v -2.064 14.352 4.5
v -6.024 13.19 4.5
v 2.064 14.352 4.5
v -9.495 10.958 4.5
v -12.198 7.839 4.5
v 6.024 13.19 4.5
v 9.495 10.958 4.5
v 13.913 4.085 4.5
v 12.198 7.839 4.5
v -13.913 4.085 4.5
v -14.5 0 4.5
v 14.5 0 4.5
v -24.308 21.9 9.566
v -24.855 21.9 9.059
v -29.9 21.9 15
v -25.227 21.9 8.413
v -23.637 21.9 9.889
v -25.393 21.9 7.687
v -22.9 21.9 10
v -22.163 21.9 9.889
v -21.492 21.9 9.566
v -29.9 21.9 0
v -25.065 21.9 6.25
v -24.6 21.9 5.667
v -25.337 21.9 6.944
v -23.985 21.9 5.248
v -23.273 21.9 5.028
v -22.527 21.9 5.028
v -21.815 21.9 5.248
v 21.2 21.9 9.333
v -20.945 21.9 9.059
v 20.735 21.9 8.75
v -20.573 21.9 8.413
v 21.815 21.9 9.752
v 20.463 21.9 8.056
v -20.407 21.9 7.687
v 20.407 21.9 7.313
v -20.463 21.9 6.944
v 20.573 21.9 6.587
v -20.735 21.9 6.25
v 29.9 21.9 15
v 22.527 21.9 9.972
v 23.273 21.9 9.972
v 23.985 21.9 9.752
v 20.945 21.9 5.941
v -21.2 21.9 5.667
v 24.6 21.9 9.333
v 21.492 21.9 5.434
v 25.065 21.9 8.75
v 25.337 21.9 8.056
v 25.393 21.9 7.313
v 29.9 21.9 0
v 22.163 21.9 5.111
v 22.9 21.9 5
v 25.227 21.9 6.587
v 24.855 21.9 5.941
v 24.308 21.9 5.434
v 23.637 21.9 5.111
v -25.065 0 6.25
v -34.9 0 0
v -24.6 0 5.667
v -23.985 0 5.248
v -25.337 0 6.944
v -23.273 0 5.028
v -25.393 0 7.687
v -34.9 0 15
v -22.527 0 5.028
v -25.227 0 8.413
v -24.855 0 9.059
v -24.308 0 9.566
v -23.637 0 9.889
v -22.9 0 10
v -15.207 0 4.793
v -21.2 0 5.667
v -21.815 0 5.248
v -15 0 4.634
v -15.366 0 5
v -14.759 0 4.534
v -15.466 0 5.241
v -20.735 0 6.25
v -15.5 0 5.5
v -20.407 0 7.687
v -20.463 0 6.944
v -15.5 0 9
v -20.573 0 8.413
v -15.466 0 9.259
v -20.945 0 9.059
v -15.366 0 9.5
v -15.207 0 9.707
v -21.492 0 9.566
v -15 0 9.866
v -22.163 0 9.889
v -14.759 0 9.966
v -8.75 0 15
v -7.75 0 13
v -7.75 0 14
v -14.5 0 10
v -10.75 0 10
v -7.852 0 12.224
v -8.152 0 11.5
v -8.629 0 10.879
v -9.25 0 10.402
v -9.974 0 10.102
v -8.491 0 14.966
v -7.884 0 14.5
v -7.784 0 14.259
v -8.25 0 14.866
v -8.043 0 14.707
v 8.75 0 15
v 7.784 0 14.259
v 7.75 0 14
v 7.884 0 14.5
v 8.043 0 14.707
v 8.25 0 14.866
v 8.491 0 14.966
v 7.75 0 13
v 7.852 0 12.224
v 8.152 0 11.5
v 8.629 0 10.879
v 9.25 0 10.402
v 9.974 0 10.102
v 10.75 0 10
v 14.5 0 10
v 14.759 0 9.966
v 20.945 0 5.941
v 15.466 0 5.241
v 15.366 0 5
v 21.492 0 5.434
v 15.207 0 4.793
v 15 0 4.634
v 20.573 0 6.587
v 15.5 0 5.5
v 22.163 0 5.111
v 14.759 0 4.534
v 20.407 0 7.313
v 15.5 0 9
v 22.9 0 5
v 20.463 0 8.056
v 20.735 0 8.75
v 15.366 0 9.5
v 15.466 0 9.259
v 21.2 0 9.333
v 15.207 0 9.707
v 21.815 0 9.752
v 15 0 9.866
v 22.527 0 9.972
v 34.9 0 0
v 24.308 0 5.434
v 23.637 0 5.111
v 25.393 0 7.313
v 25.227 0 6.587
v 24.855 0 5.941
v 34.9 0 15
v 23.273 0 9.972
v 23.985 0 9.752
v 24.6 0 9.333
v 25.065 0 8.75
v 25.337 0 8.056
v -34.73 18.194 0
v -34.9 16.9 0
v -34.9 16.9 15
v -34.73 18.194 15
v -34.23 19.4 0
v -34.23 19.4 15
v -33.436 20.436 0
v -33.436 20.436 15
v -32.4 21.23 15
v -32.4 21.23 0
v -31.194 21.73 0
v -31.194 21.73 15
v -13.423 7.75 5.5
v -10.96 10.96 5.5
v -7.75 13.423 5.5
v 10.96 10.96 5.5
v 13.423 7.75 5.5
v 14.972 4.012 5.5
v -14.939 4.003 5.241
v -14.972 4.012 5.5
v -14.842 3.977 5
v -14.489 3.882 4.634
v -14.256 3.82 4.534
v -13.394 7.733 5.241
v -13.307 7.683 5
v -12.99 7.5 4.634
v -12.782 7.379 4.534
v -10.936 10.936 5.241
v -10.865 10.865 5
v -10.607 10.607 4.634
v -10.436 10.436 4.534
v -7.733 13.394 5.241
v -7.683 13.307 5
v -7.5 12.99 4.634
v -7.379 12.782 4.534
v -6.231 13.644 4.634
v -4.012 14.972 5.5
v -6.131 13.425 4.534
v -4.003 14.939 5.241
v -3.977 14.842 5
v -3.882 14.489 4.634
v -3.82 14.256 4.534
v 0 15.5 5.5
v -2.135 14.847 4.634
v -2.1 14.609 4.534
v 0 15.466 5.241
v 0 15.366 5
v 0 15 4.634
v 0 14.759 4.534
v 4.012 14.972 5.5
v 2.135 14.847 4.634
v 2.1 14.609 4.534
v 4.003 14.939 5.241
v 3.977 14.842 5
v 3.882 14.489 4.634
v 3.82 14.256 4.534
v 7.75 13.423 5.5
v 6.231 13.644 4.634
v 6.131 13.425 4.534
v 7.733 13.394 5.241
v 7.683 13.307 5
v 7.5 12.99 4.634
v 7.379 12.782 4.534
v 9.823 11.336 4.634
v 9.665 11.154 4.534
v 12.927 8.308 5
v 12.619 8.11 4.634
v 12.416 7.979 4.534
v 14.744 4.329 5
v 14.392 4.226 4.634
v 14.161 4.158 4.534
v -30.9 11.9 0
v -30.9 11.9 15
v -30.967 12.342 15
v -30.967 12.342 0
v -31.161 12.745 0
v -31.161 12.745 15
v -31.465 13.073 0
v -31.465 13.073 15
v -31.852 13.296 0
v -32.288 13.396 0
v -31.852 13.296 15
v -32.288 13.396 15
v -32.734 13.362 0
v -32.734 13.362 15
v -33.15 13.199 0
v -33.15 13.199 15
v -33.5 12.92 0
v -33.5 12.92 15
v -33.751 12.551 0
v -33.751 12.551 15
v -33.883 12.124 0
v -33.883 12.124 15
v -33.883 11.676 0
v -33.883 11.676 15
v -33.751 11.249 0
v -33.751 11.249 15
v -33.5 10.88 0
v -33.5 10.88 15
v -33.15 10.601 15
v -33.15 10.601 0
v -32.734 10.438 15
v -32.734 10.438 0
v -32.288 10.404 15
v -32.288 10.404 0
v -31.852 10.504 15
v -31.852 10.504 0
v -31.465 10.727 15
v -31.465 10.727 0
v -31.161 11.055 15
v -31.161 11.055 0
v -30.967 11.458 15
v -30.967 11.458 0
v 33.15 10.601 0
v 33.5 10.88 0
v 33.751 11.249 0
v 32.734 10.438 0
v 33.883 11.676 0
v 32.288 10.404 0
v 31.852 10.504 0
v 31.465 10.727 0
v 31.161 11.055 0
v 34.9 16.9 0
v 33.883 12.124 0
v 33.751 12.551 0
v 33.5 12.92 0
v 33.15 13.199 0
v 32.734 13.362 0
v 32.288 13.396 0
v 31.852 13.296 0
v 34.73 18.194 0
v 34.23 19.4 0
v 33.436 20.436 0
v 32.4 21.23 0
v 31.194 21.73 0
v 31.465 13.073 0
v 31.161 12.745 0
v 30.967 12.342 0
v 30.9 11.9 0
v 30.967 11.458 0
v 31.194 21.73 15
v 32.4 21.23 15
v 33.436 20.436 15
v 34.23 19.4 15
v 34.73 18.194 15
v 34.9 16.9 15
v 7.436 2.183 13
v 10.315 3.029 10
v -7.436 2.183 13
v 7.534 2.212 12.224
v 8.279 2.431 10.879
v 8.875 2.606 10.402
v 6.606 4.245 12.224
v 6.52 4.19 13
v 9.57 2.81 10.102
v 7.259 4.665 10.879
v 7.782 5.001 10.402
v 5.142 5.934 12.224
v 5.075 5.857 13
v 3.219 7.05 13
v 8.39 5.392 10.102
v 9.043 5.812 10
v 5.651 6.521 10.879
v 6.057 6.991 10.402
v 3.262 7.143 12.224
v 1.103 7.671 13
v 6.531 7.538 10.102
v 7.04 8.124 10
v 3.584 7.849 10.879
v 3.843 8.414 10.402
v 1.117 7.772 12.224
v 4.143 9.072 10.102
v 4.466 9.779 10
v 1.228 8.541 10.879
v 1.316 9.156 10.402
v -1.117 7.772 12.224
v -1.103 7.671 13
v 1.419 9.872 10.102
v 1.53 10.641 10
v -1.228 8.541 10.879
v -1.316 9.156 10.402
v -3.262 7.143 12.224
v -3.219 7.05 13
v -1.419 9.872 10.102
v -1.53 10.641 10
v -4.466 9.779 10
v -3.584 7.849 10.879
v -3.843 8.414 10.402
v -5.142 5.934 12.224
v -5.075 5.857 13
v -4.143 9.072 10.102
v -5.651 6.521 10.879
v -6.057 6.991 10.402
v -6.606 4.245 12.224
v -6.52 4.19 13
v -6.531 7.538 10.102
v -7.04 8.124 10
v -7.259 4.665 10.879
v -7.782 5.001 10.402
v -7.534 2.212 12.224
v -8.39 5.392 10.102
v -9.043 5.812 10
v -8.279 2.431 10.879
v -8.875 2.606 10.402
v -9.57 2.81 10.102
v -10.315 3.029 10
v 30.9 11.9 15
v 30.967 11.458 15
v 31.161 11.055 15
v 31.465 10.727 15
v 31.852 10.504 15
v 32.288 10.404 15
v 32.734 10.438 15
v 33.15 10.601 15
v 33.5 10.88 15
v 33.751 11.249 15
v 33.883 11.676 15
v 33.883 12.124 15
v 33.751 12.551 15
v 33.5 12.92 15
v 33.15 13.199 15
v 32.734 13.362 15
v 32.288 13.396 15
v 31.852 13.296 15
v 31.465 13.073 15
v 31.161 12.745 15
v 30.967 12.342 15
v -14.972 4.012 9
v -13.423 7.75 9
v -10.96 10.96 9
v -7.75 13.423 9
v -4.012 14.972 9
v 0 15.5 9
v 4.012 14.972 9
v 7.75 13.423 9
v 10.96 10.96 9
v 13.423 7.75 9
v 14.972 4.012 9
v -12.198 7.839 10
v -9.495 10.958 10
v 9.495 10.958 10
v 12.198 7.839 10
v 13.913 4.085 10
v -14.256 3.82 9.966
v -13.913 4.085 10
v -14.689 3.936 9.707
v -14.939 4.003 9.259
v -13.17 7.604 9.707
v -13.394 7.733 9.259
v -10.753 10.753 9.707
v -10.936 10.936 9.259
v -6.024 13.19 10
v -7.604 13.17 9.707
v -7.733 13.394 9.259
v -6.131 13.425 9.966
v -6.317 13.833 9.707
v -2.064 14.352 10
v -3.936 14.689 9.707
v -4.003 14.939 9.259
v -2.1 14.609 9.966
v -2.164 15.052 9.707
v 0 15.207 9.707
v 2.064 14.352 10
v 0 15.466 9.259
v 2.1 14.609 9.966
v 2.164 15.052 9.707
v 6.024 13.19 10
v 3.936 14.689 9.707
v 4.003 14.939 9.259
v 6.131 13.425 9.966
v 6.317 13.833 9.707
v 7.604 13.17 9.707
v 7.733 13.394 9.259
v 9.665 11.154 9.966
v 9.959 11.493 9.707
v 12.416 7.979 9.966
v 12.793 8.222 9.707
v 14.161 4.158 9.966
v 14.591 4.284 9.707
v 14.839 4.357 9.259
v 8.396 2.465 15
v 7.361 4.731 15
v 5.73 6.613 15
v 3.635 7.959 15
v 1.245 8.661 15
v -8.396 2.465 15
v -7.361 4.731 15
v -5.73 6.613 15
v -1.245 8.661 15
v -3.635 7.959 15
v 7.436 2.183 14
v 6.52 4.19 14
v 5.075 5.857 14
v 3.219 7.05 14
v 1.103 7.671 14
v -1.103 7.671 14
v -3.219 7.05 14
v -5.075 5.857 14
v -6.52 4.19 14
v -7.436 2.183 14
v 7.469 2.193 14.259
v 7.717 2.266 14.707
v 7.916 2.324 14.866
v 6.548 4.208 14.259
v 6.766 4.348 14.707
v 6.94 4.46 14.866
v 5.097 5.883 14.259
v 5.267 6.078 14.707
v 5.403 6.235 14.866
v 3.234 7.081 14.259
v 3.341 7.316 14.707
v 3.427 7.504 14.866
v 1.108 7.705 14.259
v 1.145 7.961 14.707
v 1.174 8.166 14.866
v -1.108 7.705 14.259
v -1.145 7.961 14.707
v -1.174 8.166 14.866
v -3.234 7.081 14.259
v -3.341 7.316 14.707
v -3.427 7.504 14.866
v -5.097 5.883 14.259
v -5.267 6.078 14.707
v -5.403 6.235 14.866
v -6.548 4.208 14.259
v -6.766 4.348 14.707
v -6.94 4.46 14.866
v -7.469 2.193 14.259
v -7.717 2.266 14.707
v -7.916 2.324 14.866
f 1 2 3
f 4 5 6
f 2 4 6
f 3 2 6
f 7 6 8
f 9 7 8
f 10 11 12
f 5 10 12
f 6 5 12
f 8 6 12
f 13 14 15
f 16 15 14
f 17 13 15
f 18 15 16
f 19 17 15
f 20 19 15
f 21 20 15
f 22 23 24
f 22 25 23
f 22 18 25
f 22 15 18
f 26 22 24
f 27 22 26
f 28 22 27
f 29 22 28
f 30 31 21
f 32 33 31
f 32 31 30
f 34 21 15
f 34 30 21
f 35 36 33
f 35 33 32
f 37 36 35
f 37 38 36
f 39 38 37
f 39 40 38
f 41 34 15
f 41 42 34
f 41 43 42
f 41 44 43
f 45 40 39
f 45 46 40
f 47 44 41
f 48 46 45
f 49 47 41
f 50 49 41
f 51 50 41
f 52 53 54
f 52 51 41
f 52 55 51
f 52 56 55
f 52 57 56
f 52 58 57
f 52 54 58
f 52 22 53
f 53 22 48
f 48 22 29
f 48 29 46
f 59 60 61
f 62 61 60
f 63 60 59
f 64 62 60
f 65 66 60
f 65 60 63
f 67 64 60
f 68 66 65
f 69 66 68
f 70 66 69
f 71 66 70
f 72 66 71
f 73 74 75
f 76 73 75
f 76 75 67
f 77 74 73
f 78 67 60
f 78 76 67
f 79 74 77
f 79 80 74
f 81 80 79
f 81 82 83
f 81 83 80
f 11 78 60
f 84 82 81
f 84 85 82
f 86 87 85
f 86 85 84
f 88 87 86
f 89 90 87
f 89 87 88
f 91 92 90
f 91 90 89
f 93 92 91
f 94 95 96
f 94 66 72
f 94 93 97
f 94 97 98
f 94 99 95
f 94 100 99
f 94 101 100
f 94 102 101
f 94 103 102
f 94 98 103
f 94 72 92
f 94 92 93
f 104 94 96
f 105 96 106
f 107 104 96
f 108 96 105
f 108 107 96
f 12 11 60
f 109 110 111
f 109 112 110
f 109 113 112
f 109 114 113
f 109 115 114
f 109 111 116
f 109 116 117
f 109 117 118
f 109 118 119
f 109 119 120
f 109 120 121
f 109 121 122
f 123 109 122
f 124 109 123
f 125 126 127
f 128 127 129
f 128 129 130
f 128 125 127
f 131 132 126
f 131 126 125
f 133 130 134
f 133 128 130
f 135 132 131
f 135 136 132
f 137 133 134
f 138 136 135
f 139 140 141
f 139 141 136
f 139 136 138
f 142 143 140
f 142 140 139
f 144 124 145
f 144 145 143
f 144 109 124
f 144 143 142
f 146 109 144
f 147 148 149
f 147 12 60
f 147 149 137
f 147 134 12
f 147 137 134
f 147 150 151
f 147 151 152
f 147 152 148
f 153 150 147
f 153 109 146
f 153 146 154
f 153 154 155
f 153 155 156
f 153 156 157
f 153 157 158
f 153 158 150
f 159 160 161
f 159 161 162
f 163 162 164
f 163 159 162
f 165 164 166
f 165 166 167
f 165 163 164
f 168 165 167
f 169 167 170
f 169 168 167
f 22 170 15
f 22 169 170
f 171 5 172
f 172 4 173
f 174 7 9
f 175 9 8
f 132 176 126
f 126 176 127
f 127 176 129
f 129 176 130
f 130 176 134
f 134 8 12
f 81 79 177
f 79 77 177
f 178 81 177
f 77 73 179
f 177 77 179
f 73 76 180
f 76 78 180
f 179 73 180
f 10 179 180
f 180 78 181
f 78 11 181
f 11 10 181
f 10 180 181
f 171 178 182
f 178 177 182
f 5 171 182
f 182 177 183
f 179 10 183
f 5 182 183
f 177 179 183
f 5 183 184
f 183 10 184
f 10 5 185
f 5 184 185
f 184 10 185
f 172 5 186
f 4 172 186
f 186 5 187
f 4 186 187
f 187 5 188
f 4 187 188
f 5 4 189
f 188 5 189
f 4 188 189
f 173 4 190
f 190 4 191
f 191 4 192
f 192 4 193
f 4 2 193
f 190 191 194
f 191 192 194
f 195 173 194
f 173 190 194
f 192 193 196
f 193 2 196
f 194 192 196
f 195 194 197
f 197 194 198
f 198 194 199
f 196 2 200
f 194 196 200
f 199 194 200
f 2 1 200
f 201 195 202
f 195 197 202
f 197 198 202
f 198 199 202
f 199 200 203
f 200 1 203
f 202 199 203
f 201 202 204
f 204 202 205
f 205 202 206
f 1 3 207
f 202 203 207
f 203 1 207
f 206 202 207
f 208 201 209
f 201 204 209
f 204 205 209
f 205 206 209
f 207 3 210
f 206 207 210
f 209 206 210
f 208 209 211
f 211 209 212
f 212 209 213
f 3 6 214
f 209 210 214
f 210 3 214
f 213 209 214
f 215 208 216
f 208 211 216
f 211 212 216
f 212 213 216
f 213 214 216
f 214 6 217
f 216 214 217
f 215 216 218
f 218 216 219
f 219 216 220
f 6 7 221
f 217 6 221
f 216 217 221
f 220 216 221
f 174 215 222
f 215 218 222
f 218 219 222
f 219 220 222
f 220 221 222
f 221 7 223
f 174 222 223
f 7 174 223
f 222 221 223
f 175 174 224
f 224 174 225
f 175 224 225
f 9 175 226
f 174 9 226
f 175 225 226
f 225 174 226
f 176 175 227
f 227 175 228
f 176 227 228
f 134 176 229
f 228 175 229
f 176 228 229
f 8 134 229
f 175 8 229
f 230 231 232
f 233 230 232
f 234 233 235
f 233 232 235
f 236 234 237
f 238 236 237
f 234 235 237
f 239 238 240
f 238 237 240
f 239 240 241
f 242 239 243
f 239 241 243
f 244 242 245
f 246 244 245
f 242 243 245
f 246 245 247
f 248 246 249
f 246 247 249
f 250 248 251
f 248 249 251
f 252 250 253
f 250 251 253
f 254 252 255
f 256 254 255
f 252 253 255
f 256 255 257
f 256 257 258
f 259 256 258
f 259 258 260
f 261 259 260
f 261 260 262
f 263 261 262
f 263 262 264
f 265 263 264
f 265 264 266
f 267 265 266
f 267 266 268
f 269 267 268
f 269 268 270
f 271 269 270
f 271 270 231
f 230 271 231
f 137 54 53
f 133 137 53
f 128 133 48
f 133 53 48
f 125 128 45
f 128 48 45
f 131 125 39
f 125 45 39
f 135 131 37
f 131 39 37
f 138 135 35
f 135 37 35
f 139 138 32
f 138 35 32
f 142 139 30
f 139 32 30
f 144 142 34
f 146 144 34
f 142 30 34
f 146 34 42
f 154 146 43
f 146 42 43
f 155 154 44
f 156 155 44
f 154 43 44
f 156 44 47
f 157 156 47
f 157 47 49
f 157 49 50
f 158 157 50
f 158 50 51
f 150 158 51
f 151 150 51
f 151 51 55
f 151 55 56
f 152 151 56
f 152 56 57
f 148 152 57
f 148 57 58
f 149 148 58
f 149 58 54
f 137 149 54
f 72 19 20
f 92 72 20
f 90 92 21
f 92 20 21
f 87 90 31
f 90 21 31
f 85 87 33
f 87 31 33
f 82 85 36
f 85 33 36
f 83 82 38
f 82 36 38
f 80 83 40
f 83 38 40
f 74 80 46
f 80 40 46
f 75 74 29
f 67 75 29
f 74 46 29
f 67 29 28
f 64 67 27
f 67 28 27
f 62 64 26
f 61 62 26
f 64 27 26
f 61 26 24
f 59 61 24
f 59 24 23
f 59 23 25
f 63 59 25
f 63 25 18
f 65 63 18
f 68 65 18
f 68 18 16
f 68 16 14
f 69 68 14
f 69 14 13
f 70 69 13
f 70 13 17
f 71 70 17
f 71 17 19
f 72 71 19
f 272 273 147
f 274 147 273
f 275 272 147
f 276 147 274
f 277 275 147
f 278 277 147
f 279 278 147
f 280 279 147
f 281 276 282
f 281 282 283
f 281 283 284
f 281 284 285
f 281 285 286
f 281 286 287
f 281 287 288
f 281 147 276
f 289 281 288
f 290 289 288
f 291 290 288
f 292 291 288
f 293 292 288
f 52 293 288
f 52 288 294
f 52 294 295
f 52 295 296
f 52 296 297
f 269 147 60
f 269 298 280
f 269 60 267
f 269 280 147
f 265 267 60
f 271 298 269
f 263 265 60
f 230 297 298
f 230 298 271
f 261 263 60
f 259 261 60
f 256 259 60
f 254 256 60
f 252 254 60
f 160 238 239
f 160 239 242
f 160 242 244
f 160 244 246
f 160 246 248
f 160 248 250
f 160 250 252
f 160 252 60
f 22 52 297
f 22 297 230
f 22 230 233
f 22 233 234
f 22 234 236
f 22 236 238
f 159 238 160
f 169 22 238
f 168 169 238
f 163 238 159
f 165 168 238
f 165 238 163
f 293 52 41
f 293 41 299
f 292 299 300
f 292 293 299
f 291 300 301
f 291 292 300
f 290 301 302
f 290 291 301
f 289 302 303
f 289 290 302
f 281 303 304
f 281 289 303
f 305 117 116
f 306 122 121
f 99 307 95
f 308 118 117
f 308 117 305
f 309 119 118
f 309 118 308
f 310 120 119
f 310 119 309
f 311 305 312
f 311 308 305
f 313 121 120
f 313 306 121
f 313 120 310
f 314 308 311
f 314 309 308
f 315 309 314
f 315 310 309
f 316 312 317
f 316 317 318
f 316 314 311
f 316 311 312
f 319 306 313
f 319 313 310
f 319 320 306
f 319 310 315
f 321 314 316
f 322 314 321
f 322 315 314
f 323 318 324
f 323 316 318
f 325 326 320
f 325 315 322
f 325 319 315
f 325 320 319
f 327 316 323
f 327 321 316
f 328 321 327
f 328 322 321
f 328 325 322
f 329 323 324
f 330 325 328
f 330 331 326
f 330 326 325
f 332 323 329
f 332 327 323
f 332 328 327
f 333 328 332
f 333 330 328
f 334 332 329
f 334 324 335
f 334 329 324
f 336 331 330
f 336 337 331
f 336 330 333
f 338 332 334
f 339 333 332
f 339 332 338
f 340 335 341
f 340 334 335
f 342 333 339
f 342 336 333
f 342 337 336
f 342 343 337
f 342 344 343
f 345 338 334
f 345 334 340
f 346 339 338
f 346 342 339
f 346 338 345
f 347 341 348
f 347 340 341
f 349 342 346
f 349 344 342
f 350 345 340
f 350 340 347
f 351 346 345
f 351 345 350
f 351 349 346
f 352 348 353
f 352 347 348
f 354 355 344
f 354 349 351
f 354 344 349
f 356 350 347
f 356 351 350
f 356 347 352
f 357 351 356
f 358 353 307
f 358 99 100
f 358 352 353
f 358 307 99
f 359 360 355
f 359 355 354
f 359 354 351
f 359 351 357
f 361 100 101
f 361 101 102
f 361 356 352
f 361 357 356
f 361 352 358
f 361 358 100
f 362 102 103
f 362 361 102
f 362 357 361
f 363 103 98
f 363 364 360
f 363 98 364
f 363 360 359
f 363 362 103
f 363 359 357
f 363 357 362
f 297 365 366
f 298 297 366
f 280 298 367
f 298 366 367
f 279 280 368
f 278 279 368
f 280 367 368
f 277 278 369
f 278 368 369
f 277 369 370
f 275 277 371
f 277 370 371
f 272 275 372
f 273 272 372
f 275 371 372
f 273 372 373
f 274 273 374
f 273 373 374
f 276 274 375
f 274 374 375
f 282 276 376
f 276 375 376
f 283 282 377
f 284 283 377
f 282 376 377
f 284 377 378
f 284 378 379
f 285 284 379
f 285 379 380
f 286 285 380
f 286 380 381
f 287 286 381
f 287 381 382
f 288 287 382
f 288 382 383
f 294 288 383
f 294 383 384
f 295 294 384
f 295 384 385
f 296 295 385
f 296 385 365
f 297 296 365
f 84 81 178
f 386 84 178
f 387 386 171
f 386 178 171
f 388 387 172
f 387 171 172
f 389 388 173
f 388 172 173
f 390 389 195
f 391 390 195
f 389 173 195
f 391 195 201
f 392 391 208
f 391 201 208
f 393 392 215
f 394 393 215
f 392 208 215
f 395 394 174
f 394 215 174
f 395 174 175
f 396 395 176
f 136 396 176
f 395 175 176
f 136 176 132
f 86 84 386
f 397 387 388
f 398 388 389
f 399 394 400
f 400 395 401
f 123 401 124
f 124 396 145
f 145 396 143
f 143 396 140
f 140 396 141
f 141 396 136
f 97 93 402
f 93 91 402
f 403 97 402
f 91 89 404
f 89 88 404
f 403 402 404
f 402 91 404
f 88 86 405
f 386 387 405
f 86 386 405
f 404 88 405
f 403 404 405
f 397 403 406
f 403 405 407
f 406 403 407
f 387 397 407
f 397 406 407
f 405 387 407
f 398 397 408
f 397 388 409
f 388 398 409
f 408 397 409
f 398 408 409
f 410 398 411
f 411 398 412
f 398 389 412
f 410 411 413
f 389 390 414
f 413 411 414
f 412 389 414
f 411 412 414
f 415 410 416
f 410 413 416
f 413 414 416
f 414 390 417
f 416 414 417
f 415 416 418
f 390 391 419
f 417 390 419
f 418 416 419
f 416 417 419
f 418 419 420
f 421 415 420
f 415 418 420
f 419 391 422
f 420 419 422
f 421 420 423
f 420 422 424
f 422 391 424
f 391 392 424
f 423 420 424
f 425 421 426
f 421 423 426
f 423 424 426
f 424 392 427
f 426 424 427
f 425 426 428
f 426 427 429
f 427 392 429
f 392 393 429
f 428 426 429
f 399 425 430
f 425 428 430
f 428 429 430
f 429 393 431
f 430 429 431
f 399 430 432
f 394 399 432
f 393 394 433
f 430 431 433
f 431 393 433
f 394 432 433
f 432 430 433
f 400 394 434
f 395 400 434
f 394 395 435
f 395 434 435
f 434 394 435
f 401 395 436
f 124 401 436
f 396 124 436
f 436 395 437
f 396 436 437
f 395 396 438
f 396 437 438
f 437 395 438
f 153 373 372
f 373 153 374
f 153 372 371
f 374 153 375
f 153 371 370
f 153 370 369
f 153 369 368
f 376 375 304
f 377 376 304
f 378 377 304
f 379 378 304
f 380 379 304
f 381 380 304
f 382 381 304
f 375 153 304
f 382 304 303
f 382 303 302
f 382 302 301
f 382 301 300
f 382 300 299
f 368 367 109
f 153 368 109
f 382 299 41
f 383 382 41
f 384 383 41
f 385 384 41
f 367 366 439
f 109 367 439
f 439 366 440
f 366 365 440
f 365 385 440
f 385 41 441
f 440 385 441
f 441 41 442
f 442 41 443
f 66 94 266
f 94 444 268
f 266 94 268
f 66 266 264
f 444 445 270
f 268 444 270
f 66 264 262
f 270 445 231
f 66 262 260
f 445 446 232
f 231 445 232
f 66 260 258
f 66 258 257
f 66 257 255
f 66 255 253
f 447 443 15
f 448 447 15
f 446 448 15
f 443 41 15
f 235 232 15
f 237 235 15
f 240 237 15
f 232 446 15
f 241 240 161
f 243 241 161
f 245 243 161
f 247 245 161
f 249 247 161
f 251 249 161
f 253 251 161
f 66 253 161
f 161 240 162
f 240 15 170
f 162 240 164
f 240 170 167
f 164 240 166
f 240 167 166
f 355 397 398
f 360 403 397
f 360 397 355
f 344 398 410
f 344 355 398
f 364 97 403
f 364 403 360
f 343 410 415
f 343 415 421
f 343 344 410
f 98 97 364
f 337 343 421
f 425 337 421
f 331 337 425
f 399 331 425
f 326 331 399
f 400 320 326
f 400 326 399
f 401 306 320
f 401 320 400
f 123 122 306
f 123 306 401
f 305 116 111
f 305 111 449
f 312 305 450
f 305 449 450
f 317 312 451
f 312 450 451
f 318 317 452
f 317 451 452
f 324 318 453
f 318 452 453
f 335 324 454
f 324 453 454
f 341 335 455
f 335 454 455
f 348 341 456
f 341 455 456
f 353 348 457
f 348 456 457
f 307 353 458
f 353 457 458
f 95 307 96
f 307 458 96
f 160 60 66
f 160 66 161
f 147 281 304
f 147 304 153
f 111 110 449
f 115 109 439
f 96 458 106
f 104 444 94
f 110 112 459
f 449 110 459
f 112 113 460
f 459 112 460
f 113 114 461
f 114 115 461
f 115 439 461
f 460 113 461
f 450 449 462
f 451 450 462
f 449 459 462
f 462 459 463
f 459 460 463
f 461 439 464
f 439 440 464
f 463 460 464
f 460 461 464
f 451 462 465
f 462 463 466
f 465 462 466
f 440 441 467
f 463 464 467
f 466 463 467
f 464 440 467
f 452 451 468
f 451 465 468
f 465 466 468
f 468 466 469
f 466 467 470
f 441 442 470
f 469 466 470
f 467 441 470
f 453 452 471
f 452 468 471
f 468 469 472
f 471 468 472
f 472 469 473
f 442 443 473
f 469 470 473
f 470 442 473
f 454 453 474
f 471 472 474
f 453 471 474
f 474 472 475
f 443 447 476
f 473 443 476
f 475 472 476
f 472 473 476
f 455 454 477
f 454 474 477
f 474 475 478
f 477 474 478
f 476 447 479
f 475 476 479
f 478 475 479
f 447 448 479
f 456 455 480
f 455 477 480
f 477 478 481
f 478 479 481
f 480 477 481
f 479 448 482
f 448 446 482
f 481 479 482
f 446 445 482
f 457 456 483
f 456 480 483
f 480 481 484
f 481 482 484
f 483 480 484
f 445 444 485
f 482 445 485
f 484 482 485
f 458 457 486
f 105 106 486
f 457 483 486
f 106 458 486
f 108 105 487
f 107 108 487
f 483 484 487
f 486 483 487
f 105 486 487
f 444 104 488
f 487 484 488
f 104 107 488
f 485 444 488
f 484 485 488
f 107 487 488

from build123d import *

# Parameters (mm, degrees)
EXTRUDE_1_DEPTH     = 15
SKETCH_2_R          = 1.5
CUT_EXTRUDE_1_DEPTH = 44.847690931
SKETCH_3_R          = 7.75
CUT_EXTRUDE_2_DEPTH = 5
SKETCH_4_W          = 15.5
SKETCH_4_H          = 5.5
SKETCH_5_W          = 88.652710044
SKETCH_5_H          = 26.513310491
CUT_EXTRUDE_3_DEPTH = 44.847690931
SKETCH_6_R          = 2.5
CUT_EXTRUDE_4_DEPTH = 44.847690931
FILLET_3_R          = 1
FILLET_4_R          = 1
FILLET_5_R          = 3


with BuildPart() as part:
    # 草圖1 → 填料-伸長1 (new body)
    with BuildSketch(Plane.XY):
        with BuildLine():
            Line((-29.9, 21.9), (29.9, 21.9))
            ThreePointArc((29.9, 21.9), (33.435533906, 20.435533906), (34.9, 16.9))
            Line((34.9, 16.9), (34.9, -16.9))
            ThreePointArc((34.9, -16.9), (33.435533906, -20.435533906), (29.9, -21.9))
            Line((29.9, -21.9), (-29.9, -21.9))
            ThreePointArc((-29.9, -21.9), (-33.435533906, -20.435533906), (-34.9, -16.9))
            Line((-34.9, -16.9), (-34.9, 16.9))
            ThreePointArc((-34.9, 16.9), (-33.435533906, 20.435533906), (-29.9, 21.9))
        make_face()
    extrude(amount=EXTRUDE_1_DEPTH)

    # 草圖2 → 除料-伸長1 (cut, through all)
    with BuildSketch(Plane.XY.offset(15)):
        with Locations((-32.4, 11.9)):
            Circle(SKETCH_2_R)
        with Locations(Location((-32.4, -11.9, 0), (0, 0, 180))):
            Circle(SKETCH_2_R)
        with Locations((32.4, -11.9)):
            Circle(SKETCH_2_R)
        with Locations(Location((32.4, 11.9, 0), (0, 0, 180))):
            Circle(SKETCH_2_R)
    extrude(amount=-CUT_EXTRUDE_1_DEPTH, mode=Mode.SUBTRACT)

    # 草圖3 → 除料-伸長2 (cut)
    with BuildSketch(Plane.XY.offset(15)):
        Circle(SKETCH_3_R)
    extrude(amount=-CUT_EXTRUDE_2_DEPTH, mode=Mode.SUBTRACT)

    # 草圖4 → 除料-旋轉1 (revolve, cut)
    with BuildSketch(Plane(origin=(0, 0, 0), x_dir=(1, 0, 0), z_dir=(0, 1, 0)), mode=Mode.PRIVATE) as cut_revolve_1_sk:
        with Locations((-7.75, -7.25)):
            Rectangle(SKETCH_4_W, SKETCH_4_H)
    revolve(cut_revolve_1_sk.sketch.rotate(Axis((0, 0, 15), (0, 0, -1)), 180), axis=Axis((0, 0, 15), (0, 0, -1)), mode=Mode.SUBTRACT)

    # 草圖5 → 除料-伸長3 (cut, through all)
    with BuildSketch(Plane.XY.offset(15)):
        with Locations((0.900027513, -13.256655246)):
            Rectangle(SKETCH_5_W, SKETCH_5_H)
    extrude(amount=-CUT_EXTRUDE_3_DEPTH, mode=Mode.SUBTRACT)

    # 草圖6 → 除料-伸長4 (cut, through all)
    with BuildSketch(Plane(origin=(0, 21.9, 0), x_dir=(1, 0, 0), z_dir=(0, 1, 0))):
        with Locations(Location((-22.9, -7.5, 0), (0, 0, 270))):
            Circle(SKETCH_6_R)
        with Locations(Location((22.9, -7.5, 0), (0, 0, 90))):
            Circle(SKETCH_6_R)
    extrude(amount=-CUT_EXTRUDE_4_DEPTH, mode=Mode.SUBTRACT)

    # 圓角3
    fillet_3_edges = [part.edges().sort_by_distance(p)[0] for p in [
        (0, 15.5, 10),
        (0, 15.5, 4.5),
    ]]
    fillet(fillet_3_edges, radius=FILLET_3_R)

    # 圓角4
    fillet_4_edges = [part.edges().sort_by_distance(p)[0] for p in [
        (0, 7.75, 15),
    ]]
    fillet(fillet_4_edges, radius=FILLET_4_R)

    # 圓角5
    fillet_5_edges = [part.edges().sort_by_distance(p)[0] for p in [
        (0, 7.75, 10),
    ]]
    fillet(fillet_5_edges, radius=FILLET_5_R)


solid = part.part
